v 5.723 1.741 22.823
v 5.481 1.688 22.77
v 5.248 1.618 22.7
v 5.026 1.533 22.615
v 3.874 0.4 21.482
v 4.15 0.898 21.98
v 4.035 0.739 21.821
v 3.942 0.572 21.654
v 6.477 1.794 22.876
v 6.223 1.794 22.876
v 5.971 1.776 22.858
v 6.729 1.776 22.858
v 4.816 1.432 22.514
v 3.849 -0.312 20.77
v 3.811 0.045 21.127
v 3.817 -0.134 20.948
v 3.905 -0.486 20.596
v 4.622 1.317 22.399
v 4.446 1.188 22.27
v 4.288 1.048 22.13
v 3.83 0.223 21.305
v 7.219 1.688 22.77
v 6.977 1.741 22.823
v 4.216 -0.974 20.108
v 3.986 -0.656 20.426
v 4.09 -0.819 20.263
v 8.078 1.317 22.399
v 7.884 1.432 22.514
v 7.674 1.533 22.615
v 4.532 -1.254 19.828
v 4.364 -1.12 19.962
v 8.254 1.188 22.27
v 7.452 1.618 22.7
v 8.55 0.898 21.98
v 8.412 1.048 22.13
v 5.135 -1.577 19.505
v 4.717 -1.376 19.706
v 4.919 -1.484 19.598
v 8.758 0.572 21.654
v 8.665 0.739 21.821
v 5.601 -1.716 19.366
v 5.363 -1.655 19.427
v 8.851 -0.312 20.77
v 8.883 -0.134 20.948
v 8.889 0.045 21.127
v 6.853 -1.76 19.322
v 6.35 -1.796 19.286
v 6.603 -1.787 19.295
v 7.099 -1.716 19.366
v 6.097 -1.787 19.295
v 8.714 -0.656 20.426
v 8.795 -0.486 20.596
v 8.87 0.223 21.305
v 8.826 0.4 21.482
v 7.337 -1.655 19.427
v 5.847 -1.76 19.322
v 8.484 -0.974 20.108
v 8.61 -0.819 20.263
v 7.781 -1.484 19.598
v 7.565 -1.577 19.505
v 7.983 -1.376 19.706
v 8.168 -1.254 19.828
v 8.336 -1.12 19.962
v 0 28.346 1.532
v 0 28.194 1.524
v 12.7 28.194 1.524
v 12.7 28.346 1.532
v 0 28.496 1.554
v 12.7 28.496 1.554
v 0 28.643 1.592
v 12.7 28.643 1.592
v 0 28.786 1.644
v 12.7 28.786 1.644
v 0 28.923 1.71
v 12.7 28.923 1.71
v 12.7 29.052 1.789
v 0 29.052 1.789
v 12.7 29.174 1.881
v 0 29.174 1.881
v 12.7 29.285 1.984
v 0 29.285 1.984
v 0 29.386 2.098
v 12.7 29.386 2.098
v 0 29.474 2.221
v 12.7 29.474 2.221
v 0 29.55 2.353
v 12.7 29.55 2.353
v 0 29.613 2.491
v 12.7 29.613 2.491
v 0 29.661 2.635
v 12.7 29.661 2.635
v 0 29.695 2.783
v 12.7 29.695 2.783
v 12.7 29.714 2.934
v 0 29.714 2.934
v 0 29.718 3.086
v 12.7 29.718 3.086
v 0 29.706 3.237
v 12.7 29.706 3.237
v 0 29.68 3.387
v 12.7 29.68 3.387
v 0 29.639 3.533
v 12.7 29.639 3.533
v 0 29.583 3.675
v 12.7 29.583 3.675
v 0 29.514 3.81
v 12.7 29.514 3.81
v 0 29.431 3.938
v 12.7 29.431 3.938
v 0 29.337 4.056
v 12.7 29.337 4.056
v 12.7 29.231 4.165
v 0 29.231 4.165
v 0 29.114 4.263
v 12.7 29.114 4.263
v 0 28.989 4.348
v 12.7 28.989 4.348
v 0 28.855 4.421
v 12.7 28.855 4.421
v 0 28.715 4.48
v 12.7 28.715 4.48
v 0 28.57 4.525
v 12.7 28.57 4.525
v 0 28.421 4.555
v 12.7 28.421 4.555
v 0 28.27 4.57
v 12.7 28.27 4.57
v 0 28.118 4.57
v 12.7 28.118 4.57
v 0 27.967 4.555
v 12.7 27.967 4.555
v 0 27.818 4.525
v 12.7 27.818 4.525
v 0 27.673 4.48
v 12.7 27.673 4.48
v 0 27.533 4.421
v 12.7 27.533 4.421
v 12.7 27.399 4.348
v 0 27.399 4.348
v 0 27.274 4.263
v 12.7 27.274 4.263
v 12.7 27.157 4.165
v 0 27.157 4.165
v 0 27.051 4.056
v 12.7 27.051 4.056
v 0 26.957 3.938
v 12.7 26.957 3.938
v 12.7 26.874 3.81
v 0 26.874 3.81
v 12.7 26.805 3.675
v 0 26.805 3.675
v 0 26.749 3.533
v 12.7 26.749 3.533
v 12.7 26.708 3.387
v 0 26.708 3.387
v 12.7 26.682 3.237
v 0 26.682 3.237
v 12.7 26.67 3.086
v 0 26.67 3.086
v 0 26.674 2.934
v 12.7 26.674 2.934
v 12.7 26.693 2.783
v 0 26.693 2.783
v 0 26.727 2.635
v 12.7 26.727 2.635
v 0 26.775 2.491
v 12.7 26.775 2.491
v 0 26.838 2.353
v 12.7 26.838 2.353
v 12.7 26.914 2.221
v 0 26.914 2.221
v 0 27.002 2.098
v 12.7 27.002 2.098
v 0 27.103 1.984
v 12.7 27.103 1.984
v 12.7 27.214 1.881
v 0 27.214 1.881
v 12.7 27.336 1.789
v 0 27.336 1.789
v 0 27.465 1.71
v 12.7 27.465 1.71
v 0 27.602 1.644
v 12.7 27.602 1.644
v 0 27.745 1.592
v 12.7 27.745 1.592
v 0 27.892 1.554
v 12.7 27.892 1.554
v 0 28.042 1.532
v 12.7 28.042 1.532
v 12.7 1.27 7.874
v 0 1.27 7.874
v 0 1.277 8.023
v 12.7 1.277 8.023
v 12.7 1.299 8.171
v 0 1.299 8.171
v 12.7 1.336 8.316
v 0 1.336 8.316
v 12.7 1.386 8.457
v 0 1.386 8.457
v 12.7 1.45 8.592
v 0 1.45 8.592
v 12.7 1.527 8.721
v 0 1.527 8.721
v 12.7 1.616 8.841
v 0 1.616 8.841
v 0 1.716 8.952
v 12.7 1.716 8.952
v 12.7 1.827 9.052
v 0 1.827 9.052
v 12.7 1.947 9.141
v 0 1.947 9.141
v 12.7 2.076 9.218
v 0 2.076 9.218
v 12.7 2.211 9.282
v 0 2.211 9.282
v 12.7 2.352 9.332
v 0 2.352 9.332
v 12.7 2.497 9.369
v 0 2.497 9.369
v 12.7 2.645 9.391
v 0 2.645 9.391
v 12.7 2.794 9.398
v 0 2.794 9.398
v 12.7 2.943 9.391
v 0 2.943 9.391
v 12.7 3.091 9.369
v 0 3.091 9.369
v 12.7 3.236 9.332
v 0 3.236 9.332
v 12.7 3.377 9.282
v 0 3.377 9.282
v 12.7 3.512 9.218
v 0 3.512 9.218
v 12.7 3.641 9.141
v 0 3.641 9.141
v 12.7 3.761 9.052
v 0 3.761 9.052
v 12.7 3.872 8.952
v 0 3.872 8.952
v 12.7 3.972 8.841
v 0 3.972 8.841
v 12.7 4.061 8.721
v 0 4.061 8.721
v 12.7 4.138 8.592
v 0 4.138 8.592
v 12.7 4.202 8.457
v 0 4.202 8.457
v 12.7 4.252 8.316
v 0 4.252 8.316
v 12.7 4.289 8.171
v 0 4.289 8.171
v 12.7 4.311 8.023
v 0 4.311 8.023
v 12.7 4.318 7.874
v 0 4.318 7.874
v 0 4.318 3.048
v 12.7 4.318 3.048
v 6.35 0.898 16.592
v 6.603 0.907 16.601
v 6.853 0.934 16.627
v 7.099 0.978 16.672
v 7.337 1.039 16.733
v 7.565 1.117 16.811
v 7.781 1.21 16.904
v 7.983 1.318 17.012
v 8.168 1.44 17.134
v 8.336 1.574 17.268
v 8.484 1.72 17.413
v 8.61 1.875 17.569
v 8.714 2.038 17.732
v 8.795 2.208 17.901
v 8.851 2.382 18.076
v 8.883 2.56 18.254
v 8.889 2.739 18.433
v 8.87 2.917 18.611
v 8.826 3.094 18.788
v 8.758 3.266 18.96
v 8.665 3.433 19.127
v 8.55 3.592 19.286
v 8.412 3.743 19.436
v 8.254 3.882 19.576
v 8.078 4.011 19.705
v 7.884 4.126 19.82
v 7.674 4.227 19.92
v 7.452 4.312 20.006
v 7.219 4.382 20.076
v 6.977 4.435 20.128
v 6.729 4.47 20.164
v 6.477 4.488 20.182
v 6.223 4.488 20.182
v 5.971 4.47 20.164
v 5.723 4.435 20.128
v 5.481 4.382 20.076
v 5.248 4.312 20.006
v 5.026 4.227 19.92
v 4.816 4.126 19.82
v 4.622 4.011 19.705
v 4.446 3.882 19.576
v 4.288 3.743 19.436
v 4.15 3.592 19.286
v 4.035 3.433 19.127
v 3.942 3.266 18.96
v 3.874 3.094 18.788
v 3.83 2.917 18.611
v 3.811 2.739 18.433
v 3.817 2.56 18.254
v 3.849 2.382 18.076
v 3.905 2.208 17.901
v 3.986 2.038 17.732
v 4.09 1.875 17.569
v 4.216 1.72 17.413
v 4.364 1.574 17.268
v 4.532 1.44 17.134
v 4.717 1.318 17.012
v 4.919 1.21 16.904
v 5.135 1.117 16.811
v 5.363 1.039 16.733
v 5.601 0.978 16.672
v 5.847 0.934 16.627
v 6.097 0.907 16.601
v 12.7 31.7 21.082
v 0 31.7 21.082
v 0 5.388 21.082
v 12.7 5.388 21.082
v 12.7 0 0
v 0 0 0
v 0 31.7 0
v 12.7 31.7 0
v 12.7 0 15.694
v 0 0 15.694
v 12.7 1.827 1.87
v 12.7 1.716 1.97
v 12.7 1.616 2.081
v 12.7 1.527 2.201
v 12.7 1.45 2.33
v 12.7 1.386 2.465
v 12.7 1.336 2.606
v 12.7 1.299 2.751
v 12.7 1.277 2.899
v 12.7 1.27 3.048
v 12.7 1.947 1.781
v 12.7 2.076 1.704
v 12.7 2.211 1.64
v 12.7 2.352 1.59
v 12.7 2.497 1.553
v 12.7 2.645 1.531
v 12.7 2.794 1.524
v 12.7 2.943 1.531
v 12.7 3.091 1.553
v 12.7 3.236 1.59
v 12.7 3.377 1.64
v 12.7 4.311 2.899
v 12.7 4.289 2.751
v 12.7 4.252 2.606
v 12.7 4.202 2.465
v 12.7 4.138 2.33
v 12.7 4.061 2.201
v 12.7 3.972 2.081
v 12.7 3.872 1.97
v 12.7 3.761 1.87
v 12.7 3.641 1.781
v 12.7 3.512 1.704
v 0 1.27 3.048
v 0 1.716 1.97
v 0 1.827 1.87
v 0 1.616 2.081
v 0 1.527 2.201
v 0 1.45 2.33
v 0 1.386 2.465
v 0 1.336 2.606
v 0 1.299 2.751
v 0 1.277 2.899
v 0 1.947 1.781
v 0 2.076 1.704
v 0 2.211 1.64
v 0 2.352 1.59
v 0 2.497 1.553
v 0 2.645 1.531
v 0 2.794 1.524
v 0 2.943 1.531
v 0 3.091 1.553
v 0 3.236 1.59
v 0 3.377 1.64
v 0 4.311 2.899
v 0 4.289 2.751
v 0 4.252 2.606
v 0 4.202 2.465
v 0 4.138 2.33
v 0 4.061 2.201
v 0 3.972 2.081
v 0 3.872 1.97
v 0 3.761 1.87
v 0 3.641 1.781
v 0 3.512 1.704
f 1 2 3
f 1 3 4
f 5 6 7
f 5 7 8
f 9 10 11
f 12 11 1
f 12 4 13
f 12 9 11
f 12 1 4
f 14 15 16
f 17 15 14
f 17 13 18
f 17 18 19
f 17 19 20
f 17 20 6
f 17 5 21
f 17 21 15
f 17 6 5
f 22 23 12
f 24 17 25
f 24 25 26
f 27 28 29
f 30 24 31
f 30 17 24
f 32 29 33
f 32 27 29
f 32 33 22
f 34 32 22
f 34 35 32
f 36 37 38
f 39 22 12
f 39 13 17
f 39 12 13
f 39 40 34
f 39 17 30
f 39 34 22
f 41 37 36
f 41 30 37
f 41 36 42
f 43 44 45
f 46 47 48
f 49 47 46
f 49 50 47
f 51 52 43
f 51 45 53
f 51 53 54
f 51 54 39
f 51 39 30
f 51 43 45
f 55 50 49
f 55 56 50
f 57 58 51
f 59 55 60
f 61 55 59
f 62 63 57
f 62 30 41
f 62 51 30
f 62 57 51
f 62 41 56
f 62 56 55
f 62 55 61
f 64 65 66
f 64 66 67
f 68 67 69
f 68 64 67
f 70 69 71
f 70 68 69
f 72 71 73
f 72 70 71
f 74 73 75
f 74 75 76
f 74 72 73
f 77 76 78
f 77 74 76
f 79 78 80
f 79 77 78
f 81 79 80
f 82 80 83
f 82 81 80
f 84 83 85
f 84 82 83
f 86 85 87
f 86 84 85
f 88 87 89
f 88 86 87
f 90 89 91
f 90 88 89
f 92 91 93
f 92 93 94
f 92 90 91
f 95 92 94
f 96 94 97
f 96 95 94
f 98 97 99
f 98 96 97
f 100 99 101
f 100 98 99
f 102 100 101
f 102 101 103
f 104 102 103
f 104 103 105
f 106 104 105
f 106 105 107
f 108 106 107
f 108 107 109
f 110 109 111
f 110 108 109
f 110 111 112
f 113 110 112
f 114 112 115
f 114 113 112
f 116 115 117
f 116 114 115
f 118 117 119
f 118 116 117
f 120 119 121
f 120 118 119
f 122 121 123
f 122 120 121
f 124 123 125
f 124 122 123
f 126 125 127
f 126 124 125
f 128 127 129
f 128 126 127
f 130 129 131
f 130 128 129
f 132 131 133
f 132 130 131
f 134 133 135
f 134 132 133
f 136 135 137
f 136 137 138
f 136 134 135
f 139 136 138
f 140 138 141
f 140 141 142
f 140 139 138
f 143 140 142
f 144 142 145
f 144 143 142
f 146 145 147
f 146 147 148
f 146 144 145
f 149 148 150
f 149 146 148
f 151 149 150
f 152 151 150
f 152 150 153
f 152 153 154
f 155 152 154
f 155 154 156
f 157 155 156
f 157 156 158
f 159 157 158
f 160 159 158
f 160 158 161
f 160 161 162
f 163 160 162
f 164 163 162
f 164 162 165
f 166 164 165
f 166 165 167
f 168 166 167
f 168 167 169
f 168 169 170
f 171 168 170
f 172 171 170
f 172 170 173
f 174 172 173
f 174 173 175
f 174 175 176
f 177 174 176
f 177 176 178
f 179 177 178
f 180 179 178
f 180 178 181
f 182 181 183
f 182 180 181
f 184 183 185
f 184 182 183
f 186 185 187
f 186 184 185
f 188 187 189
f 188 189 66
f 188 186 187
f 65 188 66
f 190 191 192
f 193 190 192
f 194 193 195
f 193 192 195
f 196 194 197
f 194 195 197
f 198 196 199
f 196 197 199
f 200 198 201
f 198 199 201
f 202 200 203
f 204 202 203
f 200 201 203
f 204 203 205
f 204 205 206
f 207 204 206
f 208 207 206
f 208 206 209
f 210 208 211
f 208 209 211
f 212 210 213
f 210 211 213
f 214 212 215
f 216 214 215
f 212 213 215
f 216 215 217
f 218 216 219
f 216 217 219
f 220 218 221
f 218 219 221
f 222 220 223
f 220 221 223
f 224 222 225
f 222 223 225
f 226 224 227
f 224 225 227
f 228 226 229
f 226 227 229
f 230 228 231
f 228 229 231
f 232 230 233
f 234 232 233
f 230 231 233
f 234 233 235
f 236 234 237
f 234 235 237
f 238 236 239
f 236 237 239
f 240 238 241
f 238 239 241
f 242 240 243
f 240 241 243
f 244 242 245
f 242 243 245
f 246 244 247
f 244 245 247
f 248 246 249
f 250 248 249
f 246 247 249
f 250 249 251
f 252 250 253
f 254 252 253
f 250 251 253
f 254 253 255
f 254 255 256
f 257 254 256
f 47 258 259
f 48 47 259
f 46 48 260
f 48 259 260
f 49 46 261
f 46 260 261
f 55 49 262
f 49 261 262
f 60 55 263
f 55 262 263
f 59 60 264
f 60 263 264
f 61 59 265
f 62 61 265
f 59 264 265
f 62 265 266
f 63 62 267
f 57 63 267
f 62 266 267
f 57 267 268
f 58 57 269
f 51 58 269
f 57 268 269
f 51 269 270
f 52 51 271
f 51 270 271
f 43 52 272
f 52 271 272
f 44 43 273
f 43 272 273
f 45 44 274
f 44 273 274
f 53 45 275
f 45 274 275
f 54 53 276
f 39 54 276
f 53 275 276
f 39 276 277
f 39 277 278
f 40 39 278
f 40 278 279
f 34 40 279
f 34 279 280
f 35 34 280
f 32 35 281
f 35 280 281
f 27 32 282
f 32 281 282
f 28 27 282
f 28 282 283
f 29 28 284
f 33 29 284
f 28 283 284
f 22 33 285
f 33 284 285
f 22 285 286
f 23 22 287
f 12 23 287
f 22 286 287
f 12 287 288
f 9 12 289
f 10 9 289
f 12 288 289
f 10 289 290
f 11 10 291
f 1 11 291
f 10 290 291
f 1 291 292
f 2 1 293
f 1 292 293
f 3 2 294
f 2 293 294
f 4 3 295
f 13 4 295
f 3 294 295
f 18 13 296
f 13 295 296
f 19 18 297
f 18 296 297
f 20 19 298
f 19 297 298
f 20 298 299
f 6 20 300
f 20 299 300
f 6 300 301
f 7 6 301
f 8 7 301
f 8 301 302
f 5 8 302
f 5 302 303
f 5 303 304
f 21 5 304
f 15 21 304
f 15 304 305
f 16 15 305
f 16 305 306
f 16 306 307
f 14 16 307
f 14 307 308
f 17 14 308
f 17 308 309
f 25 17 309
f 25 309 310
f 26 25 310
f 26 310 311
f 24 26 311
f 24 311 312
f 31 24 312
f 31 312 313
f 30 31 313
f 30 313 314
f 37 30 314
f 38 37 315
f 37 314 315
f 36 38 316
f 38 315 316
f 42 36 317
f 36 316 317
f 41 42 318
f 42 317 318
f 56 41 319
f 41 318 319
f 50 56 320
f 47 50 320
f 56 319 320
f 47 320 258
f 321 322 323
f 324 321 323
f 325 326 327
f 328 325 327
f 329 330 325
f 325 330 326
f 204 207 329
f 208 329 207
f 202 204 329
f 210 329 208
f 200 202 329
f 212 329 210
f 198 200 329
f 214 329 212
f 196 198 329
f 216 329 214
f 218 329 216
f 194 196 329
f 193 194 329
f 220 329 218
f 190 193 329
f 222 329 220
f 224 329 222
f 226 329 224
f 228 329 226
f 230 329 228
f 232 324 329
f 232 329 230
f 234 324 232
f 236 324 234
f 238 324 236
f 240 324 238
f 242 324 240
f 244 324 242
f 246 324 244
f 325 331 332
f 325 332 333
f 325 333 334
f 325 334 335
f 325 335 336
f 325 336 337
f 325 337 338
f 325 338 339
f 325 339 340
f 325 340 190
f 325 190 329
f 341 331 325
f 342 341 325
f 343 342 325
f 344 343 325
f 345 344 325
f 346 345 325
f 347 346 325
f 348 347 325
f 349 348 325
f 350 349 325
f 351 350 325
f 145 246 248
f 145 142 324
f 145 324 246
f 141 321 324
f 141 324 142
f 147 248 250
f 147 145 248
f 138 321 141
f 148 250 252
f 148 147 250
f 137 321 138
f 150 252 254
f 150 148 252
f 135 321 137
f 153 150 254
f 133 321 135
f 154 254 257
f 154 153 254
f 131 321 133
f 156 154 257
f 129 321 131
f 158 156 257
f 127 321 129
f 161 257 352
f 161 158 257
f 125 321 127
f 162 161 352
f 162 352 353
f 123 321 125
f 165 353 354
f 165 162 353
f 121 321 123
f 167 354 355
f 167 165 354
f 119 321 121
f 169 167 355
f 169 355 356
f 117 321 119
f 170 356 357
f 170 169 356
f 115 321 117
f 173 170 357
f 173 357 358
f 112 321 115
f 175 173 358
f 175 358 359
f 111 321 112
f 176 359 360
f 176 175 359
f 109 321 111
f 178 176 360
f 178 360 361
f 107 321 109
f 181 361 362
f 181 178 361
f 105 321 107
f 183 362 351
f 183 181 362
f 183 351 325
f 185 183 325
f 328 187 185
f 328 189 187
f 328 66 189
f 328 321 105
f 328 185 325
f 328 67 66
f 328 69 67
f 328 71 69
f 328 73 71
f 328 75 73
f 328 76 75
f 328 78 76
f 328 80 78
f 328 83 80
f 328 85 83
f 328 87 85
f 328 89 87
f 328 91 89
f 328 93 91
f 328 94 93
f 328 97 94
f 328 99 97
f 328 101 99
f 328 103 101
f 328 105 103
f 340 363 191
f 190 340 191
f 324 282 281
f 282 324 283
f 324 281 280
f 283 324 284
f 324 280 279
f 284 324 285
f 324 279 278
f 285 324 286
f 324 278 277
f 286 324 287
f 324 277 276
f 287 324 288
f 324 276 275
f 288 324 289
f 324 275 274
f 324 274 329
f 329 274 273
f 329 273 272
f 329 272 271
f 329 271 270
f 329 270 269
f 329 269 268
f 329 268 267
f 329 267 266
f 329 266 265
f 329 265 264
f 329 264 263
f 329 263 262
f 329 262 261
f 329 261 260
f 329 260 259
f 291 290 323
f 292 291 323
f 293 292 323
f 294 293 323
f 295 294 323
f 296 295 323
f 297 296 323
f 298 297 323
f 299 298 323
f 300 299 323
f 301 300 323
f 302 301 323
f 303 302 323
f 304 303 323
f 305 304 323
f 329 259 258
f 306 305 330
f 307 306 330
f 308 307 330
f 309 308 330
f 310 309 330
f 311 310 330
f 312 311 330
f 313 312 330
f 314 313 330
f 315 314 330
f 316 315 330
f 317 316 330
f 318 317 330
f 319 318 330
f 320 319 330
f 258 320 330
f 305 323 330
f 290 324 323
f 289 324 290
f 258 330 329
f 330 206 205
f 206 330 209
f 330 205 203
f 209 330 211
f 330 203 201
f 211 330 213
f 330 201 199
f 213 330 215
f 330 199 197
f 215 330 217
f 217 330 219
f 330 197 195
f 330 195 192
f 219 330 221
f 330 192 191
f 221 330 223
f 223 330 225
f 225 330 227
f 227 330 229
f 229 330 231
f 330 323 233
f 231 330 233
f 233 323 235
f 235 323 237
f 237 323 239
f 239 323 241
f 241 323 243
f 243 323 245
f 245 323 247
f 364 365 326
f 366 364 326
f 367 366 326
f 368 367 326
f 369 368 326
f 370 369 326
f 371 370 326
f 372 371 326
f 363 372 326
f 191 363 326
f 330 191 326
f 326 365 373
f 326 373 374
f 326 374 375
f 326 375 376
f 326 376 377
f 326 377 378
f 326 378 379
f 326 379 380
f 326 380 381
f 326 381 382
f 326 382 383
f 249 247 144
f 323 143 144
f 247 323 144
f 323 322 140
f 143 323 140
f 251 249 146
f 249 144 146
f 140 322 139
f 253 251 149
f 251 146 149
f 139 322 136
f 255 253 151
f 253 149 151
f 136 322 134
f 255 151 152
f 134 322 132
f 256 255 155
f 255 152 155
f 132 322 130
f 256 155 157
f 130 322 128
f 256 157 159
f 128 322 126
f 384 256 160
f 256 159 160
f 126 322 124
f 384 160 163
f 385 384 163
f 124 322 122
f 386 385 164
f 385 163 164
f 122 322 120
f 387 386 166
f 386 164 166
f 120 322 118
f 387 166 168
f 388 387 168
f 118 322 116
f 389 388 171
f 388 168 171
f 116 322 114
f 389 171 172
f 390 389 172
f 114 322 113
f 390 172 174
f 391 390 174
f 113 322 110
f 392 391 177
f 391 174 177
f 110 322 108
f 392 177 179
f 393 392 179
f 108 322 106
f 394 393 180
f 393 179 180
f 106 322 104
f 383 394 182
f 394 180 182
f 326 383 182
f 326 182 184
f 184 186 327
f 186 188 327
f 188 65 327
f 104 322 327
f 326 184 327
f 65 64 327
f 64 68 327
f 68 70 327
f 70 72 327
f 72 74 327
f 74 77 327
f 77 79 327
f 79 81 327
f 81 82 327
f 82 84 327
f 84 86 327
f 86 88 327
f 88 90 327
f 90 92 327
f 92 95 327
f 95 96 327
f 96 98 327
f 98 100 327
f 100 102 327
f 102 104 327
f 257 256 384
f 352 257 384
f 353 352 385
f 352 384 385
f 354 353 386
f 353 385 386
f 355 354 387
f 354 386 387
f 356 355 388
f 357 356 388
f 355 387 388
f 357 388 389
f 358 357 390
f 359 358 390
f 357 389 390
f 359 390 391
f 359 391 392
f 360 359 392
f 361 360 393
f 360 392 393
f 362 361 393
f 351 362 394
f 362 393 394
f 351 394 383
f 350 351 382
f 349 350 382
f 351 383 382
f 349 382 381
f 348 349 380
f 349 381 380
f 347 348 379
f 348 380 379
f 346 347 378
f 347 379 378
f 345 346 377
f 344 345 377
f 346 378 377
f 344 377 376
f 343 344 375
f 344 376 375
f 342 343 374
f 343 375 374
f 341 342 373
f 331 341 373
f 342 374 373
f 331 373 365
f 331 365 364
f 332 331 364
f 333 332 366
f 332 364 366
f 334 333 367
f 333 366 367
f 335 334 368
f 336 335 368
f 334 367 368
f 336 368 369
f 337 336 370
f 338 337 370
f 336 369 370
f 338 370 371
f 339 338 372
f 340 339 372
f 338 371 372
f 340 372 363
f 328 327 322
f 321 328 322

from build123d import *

# Parameters (mm, degrees)
SKETCH1_R           = 1.524
BOSS_EXTRUDE1_DEPTH = 12.7
SKETCH3_R           = 2.54
BOSS_EXTRUDE2_DEPTH = 3.81


with BuildPart() as part:
    # Sketch1 → Boss-Extrude1 (new body)
    with BuildSketch(Plane(origin=(0, 0, 0), x_dir=(0, 0, -1), z_dir=(1, 0, 0))):
        Polygon((-21.082, 5.388153673), (-15.693846327, 0), (0, 0), (0, 31.7), (-21.082, 31.7), align=None)
        with Locations((-3.048, 28.194)):
            Circle(SKETCH1_R, mode=Mode.SUBTRACT)
        with BuildLine():
            Line((-7.874, 4.318), (-3.048, 4.318))
            ThreePointArc((-3.048, 4.318), (-1.524, 2.794), (-3.048, 1.27))
            Line((-3.048, 1.27), (-7.874, 1.27))
            ThreePointArc((-7.874, 1.27), (-9.398, 2.794), (-7.874, 4.318))
        make_face(mode=Mode.SUBTRACT)
    extrude(amount=BOSS_EXTRUDE1_DEPTH)

    # Sketch3 → Boss-Extrude2 (add)
    with BuildSketch(Plane(origin=(0, -7.846923164, 7.846923164), x_dir=(1, 0, 0), z_dir=(0, -0.7071067811865464, 0.7071067811865488))):
        with Locations(Location((6.35, 14.907225161, 0), (0, 0, 270))):
            Circle(SKETCH3_R)
    extrude(amount=BOSS_EXTRUDE2_DEPTH)


solid = part.part
